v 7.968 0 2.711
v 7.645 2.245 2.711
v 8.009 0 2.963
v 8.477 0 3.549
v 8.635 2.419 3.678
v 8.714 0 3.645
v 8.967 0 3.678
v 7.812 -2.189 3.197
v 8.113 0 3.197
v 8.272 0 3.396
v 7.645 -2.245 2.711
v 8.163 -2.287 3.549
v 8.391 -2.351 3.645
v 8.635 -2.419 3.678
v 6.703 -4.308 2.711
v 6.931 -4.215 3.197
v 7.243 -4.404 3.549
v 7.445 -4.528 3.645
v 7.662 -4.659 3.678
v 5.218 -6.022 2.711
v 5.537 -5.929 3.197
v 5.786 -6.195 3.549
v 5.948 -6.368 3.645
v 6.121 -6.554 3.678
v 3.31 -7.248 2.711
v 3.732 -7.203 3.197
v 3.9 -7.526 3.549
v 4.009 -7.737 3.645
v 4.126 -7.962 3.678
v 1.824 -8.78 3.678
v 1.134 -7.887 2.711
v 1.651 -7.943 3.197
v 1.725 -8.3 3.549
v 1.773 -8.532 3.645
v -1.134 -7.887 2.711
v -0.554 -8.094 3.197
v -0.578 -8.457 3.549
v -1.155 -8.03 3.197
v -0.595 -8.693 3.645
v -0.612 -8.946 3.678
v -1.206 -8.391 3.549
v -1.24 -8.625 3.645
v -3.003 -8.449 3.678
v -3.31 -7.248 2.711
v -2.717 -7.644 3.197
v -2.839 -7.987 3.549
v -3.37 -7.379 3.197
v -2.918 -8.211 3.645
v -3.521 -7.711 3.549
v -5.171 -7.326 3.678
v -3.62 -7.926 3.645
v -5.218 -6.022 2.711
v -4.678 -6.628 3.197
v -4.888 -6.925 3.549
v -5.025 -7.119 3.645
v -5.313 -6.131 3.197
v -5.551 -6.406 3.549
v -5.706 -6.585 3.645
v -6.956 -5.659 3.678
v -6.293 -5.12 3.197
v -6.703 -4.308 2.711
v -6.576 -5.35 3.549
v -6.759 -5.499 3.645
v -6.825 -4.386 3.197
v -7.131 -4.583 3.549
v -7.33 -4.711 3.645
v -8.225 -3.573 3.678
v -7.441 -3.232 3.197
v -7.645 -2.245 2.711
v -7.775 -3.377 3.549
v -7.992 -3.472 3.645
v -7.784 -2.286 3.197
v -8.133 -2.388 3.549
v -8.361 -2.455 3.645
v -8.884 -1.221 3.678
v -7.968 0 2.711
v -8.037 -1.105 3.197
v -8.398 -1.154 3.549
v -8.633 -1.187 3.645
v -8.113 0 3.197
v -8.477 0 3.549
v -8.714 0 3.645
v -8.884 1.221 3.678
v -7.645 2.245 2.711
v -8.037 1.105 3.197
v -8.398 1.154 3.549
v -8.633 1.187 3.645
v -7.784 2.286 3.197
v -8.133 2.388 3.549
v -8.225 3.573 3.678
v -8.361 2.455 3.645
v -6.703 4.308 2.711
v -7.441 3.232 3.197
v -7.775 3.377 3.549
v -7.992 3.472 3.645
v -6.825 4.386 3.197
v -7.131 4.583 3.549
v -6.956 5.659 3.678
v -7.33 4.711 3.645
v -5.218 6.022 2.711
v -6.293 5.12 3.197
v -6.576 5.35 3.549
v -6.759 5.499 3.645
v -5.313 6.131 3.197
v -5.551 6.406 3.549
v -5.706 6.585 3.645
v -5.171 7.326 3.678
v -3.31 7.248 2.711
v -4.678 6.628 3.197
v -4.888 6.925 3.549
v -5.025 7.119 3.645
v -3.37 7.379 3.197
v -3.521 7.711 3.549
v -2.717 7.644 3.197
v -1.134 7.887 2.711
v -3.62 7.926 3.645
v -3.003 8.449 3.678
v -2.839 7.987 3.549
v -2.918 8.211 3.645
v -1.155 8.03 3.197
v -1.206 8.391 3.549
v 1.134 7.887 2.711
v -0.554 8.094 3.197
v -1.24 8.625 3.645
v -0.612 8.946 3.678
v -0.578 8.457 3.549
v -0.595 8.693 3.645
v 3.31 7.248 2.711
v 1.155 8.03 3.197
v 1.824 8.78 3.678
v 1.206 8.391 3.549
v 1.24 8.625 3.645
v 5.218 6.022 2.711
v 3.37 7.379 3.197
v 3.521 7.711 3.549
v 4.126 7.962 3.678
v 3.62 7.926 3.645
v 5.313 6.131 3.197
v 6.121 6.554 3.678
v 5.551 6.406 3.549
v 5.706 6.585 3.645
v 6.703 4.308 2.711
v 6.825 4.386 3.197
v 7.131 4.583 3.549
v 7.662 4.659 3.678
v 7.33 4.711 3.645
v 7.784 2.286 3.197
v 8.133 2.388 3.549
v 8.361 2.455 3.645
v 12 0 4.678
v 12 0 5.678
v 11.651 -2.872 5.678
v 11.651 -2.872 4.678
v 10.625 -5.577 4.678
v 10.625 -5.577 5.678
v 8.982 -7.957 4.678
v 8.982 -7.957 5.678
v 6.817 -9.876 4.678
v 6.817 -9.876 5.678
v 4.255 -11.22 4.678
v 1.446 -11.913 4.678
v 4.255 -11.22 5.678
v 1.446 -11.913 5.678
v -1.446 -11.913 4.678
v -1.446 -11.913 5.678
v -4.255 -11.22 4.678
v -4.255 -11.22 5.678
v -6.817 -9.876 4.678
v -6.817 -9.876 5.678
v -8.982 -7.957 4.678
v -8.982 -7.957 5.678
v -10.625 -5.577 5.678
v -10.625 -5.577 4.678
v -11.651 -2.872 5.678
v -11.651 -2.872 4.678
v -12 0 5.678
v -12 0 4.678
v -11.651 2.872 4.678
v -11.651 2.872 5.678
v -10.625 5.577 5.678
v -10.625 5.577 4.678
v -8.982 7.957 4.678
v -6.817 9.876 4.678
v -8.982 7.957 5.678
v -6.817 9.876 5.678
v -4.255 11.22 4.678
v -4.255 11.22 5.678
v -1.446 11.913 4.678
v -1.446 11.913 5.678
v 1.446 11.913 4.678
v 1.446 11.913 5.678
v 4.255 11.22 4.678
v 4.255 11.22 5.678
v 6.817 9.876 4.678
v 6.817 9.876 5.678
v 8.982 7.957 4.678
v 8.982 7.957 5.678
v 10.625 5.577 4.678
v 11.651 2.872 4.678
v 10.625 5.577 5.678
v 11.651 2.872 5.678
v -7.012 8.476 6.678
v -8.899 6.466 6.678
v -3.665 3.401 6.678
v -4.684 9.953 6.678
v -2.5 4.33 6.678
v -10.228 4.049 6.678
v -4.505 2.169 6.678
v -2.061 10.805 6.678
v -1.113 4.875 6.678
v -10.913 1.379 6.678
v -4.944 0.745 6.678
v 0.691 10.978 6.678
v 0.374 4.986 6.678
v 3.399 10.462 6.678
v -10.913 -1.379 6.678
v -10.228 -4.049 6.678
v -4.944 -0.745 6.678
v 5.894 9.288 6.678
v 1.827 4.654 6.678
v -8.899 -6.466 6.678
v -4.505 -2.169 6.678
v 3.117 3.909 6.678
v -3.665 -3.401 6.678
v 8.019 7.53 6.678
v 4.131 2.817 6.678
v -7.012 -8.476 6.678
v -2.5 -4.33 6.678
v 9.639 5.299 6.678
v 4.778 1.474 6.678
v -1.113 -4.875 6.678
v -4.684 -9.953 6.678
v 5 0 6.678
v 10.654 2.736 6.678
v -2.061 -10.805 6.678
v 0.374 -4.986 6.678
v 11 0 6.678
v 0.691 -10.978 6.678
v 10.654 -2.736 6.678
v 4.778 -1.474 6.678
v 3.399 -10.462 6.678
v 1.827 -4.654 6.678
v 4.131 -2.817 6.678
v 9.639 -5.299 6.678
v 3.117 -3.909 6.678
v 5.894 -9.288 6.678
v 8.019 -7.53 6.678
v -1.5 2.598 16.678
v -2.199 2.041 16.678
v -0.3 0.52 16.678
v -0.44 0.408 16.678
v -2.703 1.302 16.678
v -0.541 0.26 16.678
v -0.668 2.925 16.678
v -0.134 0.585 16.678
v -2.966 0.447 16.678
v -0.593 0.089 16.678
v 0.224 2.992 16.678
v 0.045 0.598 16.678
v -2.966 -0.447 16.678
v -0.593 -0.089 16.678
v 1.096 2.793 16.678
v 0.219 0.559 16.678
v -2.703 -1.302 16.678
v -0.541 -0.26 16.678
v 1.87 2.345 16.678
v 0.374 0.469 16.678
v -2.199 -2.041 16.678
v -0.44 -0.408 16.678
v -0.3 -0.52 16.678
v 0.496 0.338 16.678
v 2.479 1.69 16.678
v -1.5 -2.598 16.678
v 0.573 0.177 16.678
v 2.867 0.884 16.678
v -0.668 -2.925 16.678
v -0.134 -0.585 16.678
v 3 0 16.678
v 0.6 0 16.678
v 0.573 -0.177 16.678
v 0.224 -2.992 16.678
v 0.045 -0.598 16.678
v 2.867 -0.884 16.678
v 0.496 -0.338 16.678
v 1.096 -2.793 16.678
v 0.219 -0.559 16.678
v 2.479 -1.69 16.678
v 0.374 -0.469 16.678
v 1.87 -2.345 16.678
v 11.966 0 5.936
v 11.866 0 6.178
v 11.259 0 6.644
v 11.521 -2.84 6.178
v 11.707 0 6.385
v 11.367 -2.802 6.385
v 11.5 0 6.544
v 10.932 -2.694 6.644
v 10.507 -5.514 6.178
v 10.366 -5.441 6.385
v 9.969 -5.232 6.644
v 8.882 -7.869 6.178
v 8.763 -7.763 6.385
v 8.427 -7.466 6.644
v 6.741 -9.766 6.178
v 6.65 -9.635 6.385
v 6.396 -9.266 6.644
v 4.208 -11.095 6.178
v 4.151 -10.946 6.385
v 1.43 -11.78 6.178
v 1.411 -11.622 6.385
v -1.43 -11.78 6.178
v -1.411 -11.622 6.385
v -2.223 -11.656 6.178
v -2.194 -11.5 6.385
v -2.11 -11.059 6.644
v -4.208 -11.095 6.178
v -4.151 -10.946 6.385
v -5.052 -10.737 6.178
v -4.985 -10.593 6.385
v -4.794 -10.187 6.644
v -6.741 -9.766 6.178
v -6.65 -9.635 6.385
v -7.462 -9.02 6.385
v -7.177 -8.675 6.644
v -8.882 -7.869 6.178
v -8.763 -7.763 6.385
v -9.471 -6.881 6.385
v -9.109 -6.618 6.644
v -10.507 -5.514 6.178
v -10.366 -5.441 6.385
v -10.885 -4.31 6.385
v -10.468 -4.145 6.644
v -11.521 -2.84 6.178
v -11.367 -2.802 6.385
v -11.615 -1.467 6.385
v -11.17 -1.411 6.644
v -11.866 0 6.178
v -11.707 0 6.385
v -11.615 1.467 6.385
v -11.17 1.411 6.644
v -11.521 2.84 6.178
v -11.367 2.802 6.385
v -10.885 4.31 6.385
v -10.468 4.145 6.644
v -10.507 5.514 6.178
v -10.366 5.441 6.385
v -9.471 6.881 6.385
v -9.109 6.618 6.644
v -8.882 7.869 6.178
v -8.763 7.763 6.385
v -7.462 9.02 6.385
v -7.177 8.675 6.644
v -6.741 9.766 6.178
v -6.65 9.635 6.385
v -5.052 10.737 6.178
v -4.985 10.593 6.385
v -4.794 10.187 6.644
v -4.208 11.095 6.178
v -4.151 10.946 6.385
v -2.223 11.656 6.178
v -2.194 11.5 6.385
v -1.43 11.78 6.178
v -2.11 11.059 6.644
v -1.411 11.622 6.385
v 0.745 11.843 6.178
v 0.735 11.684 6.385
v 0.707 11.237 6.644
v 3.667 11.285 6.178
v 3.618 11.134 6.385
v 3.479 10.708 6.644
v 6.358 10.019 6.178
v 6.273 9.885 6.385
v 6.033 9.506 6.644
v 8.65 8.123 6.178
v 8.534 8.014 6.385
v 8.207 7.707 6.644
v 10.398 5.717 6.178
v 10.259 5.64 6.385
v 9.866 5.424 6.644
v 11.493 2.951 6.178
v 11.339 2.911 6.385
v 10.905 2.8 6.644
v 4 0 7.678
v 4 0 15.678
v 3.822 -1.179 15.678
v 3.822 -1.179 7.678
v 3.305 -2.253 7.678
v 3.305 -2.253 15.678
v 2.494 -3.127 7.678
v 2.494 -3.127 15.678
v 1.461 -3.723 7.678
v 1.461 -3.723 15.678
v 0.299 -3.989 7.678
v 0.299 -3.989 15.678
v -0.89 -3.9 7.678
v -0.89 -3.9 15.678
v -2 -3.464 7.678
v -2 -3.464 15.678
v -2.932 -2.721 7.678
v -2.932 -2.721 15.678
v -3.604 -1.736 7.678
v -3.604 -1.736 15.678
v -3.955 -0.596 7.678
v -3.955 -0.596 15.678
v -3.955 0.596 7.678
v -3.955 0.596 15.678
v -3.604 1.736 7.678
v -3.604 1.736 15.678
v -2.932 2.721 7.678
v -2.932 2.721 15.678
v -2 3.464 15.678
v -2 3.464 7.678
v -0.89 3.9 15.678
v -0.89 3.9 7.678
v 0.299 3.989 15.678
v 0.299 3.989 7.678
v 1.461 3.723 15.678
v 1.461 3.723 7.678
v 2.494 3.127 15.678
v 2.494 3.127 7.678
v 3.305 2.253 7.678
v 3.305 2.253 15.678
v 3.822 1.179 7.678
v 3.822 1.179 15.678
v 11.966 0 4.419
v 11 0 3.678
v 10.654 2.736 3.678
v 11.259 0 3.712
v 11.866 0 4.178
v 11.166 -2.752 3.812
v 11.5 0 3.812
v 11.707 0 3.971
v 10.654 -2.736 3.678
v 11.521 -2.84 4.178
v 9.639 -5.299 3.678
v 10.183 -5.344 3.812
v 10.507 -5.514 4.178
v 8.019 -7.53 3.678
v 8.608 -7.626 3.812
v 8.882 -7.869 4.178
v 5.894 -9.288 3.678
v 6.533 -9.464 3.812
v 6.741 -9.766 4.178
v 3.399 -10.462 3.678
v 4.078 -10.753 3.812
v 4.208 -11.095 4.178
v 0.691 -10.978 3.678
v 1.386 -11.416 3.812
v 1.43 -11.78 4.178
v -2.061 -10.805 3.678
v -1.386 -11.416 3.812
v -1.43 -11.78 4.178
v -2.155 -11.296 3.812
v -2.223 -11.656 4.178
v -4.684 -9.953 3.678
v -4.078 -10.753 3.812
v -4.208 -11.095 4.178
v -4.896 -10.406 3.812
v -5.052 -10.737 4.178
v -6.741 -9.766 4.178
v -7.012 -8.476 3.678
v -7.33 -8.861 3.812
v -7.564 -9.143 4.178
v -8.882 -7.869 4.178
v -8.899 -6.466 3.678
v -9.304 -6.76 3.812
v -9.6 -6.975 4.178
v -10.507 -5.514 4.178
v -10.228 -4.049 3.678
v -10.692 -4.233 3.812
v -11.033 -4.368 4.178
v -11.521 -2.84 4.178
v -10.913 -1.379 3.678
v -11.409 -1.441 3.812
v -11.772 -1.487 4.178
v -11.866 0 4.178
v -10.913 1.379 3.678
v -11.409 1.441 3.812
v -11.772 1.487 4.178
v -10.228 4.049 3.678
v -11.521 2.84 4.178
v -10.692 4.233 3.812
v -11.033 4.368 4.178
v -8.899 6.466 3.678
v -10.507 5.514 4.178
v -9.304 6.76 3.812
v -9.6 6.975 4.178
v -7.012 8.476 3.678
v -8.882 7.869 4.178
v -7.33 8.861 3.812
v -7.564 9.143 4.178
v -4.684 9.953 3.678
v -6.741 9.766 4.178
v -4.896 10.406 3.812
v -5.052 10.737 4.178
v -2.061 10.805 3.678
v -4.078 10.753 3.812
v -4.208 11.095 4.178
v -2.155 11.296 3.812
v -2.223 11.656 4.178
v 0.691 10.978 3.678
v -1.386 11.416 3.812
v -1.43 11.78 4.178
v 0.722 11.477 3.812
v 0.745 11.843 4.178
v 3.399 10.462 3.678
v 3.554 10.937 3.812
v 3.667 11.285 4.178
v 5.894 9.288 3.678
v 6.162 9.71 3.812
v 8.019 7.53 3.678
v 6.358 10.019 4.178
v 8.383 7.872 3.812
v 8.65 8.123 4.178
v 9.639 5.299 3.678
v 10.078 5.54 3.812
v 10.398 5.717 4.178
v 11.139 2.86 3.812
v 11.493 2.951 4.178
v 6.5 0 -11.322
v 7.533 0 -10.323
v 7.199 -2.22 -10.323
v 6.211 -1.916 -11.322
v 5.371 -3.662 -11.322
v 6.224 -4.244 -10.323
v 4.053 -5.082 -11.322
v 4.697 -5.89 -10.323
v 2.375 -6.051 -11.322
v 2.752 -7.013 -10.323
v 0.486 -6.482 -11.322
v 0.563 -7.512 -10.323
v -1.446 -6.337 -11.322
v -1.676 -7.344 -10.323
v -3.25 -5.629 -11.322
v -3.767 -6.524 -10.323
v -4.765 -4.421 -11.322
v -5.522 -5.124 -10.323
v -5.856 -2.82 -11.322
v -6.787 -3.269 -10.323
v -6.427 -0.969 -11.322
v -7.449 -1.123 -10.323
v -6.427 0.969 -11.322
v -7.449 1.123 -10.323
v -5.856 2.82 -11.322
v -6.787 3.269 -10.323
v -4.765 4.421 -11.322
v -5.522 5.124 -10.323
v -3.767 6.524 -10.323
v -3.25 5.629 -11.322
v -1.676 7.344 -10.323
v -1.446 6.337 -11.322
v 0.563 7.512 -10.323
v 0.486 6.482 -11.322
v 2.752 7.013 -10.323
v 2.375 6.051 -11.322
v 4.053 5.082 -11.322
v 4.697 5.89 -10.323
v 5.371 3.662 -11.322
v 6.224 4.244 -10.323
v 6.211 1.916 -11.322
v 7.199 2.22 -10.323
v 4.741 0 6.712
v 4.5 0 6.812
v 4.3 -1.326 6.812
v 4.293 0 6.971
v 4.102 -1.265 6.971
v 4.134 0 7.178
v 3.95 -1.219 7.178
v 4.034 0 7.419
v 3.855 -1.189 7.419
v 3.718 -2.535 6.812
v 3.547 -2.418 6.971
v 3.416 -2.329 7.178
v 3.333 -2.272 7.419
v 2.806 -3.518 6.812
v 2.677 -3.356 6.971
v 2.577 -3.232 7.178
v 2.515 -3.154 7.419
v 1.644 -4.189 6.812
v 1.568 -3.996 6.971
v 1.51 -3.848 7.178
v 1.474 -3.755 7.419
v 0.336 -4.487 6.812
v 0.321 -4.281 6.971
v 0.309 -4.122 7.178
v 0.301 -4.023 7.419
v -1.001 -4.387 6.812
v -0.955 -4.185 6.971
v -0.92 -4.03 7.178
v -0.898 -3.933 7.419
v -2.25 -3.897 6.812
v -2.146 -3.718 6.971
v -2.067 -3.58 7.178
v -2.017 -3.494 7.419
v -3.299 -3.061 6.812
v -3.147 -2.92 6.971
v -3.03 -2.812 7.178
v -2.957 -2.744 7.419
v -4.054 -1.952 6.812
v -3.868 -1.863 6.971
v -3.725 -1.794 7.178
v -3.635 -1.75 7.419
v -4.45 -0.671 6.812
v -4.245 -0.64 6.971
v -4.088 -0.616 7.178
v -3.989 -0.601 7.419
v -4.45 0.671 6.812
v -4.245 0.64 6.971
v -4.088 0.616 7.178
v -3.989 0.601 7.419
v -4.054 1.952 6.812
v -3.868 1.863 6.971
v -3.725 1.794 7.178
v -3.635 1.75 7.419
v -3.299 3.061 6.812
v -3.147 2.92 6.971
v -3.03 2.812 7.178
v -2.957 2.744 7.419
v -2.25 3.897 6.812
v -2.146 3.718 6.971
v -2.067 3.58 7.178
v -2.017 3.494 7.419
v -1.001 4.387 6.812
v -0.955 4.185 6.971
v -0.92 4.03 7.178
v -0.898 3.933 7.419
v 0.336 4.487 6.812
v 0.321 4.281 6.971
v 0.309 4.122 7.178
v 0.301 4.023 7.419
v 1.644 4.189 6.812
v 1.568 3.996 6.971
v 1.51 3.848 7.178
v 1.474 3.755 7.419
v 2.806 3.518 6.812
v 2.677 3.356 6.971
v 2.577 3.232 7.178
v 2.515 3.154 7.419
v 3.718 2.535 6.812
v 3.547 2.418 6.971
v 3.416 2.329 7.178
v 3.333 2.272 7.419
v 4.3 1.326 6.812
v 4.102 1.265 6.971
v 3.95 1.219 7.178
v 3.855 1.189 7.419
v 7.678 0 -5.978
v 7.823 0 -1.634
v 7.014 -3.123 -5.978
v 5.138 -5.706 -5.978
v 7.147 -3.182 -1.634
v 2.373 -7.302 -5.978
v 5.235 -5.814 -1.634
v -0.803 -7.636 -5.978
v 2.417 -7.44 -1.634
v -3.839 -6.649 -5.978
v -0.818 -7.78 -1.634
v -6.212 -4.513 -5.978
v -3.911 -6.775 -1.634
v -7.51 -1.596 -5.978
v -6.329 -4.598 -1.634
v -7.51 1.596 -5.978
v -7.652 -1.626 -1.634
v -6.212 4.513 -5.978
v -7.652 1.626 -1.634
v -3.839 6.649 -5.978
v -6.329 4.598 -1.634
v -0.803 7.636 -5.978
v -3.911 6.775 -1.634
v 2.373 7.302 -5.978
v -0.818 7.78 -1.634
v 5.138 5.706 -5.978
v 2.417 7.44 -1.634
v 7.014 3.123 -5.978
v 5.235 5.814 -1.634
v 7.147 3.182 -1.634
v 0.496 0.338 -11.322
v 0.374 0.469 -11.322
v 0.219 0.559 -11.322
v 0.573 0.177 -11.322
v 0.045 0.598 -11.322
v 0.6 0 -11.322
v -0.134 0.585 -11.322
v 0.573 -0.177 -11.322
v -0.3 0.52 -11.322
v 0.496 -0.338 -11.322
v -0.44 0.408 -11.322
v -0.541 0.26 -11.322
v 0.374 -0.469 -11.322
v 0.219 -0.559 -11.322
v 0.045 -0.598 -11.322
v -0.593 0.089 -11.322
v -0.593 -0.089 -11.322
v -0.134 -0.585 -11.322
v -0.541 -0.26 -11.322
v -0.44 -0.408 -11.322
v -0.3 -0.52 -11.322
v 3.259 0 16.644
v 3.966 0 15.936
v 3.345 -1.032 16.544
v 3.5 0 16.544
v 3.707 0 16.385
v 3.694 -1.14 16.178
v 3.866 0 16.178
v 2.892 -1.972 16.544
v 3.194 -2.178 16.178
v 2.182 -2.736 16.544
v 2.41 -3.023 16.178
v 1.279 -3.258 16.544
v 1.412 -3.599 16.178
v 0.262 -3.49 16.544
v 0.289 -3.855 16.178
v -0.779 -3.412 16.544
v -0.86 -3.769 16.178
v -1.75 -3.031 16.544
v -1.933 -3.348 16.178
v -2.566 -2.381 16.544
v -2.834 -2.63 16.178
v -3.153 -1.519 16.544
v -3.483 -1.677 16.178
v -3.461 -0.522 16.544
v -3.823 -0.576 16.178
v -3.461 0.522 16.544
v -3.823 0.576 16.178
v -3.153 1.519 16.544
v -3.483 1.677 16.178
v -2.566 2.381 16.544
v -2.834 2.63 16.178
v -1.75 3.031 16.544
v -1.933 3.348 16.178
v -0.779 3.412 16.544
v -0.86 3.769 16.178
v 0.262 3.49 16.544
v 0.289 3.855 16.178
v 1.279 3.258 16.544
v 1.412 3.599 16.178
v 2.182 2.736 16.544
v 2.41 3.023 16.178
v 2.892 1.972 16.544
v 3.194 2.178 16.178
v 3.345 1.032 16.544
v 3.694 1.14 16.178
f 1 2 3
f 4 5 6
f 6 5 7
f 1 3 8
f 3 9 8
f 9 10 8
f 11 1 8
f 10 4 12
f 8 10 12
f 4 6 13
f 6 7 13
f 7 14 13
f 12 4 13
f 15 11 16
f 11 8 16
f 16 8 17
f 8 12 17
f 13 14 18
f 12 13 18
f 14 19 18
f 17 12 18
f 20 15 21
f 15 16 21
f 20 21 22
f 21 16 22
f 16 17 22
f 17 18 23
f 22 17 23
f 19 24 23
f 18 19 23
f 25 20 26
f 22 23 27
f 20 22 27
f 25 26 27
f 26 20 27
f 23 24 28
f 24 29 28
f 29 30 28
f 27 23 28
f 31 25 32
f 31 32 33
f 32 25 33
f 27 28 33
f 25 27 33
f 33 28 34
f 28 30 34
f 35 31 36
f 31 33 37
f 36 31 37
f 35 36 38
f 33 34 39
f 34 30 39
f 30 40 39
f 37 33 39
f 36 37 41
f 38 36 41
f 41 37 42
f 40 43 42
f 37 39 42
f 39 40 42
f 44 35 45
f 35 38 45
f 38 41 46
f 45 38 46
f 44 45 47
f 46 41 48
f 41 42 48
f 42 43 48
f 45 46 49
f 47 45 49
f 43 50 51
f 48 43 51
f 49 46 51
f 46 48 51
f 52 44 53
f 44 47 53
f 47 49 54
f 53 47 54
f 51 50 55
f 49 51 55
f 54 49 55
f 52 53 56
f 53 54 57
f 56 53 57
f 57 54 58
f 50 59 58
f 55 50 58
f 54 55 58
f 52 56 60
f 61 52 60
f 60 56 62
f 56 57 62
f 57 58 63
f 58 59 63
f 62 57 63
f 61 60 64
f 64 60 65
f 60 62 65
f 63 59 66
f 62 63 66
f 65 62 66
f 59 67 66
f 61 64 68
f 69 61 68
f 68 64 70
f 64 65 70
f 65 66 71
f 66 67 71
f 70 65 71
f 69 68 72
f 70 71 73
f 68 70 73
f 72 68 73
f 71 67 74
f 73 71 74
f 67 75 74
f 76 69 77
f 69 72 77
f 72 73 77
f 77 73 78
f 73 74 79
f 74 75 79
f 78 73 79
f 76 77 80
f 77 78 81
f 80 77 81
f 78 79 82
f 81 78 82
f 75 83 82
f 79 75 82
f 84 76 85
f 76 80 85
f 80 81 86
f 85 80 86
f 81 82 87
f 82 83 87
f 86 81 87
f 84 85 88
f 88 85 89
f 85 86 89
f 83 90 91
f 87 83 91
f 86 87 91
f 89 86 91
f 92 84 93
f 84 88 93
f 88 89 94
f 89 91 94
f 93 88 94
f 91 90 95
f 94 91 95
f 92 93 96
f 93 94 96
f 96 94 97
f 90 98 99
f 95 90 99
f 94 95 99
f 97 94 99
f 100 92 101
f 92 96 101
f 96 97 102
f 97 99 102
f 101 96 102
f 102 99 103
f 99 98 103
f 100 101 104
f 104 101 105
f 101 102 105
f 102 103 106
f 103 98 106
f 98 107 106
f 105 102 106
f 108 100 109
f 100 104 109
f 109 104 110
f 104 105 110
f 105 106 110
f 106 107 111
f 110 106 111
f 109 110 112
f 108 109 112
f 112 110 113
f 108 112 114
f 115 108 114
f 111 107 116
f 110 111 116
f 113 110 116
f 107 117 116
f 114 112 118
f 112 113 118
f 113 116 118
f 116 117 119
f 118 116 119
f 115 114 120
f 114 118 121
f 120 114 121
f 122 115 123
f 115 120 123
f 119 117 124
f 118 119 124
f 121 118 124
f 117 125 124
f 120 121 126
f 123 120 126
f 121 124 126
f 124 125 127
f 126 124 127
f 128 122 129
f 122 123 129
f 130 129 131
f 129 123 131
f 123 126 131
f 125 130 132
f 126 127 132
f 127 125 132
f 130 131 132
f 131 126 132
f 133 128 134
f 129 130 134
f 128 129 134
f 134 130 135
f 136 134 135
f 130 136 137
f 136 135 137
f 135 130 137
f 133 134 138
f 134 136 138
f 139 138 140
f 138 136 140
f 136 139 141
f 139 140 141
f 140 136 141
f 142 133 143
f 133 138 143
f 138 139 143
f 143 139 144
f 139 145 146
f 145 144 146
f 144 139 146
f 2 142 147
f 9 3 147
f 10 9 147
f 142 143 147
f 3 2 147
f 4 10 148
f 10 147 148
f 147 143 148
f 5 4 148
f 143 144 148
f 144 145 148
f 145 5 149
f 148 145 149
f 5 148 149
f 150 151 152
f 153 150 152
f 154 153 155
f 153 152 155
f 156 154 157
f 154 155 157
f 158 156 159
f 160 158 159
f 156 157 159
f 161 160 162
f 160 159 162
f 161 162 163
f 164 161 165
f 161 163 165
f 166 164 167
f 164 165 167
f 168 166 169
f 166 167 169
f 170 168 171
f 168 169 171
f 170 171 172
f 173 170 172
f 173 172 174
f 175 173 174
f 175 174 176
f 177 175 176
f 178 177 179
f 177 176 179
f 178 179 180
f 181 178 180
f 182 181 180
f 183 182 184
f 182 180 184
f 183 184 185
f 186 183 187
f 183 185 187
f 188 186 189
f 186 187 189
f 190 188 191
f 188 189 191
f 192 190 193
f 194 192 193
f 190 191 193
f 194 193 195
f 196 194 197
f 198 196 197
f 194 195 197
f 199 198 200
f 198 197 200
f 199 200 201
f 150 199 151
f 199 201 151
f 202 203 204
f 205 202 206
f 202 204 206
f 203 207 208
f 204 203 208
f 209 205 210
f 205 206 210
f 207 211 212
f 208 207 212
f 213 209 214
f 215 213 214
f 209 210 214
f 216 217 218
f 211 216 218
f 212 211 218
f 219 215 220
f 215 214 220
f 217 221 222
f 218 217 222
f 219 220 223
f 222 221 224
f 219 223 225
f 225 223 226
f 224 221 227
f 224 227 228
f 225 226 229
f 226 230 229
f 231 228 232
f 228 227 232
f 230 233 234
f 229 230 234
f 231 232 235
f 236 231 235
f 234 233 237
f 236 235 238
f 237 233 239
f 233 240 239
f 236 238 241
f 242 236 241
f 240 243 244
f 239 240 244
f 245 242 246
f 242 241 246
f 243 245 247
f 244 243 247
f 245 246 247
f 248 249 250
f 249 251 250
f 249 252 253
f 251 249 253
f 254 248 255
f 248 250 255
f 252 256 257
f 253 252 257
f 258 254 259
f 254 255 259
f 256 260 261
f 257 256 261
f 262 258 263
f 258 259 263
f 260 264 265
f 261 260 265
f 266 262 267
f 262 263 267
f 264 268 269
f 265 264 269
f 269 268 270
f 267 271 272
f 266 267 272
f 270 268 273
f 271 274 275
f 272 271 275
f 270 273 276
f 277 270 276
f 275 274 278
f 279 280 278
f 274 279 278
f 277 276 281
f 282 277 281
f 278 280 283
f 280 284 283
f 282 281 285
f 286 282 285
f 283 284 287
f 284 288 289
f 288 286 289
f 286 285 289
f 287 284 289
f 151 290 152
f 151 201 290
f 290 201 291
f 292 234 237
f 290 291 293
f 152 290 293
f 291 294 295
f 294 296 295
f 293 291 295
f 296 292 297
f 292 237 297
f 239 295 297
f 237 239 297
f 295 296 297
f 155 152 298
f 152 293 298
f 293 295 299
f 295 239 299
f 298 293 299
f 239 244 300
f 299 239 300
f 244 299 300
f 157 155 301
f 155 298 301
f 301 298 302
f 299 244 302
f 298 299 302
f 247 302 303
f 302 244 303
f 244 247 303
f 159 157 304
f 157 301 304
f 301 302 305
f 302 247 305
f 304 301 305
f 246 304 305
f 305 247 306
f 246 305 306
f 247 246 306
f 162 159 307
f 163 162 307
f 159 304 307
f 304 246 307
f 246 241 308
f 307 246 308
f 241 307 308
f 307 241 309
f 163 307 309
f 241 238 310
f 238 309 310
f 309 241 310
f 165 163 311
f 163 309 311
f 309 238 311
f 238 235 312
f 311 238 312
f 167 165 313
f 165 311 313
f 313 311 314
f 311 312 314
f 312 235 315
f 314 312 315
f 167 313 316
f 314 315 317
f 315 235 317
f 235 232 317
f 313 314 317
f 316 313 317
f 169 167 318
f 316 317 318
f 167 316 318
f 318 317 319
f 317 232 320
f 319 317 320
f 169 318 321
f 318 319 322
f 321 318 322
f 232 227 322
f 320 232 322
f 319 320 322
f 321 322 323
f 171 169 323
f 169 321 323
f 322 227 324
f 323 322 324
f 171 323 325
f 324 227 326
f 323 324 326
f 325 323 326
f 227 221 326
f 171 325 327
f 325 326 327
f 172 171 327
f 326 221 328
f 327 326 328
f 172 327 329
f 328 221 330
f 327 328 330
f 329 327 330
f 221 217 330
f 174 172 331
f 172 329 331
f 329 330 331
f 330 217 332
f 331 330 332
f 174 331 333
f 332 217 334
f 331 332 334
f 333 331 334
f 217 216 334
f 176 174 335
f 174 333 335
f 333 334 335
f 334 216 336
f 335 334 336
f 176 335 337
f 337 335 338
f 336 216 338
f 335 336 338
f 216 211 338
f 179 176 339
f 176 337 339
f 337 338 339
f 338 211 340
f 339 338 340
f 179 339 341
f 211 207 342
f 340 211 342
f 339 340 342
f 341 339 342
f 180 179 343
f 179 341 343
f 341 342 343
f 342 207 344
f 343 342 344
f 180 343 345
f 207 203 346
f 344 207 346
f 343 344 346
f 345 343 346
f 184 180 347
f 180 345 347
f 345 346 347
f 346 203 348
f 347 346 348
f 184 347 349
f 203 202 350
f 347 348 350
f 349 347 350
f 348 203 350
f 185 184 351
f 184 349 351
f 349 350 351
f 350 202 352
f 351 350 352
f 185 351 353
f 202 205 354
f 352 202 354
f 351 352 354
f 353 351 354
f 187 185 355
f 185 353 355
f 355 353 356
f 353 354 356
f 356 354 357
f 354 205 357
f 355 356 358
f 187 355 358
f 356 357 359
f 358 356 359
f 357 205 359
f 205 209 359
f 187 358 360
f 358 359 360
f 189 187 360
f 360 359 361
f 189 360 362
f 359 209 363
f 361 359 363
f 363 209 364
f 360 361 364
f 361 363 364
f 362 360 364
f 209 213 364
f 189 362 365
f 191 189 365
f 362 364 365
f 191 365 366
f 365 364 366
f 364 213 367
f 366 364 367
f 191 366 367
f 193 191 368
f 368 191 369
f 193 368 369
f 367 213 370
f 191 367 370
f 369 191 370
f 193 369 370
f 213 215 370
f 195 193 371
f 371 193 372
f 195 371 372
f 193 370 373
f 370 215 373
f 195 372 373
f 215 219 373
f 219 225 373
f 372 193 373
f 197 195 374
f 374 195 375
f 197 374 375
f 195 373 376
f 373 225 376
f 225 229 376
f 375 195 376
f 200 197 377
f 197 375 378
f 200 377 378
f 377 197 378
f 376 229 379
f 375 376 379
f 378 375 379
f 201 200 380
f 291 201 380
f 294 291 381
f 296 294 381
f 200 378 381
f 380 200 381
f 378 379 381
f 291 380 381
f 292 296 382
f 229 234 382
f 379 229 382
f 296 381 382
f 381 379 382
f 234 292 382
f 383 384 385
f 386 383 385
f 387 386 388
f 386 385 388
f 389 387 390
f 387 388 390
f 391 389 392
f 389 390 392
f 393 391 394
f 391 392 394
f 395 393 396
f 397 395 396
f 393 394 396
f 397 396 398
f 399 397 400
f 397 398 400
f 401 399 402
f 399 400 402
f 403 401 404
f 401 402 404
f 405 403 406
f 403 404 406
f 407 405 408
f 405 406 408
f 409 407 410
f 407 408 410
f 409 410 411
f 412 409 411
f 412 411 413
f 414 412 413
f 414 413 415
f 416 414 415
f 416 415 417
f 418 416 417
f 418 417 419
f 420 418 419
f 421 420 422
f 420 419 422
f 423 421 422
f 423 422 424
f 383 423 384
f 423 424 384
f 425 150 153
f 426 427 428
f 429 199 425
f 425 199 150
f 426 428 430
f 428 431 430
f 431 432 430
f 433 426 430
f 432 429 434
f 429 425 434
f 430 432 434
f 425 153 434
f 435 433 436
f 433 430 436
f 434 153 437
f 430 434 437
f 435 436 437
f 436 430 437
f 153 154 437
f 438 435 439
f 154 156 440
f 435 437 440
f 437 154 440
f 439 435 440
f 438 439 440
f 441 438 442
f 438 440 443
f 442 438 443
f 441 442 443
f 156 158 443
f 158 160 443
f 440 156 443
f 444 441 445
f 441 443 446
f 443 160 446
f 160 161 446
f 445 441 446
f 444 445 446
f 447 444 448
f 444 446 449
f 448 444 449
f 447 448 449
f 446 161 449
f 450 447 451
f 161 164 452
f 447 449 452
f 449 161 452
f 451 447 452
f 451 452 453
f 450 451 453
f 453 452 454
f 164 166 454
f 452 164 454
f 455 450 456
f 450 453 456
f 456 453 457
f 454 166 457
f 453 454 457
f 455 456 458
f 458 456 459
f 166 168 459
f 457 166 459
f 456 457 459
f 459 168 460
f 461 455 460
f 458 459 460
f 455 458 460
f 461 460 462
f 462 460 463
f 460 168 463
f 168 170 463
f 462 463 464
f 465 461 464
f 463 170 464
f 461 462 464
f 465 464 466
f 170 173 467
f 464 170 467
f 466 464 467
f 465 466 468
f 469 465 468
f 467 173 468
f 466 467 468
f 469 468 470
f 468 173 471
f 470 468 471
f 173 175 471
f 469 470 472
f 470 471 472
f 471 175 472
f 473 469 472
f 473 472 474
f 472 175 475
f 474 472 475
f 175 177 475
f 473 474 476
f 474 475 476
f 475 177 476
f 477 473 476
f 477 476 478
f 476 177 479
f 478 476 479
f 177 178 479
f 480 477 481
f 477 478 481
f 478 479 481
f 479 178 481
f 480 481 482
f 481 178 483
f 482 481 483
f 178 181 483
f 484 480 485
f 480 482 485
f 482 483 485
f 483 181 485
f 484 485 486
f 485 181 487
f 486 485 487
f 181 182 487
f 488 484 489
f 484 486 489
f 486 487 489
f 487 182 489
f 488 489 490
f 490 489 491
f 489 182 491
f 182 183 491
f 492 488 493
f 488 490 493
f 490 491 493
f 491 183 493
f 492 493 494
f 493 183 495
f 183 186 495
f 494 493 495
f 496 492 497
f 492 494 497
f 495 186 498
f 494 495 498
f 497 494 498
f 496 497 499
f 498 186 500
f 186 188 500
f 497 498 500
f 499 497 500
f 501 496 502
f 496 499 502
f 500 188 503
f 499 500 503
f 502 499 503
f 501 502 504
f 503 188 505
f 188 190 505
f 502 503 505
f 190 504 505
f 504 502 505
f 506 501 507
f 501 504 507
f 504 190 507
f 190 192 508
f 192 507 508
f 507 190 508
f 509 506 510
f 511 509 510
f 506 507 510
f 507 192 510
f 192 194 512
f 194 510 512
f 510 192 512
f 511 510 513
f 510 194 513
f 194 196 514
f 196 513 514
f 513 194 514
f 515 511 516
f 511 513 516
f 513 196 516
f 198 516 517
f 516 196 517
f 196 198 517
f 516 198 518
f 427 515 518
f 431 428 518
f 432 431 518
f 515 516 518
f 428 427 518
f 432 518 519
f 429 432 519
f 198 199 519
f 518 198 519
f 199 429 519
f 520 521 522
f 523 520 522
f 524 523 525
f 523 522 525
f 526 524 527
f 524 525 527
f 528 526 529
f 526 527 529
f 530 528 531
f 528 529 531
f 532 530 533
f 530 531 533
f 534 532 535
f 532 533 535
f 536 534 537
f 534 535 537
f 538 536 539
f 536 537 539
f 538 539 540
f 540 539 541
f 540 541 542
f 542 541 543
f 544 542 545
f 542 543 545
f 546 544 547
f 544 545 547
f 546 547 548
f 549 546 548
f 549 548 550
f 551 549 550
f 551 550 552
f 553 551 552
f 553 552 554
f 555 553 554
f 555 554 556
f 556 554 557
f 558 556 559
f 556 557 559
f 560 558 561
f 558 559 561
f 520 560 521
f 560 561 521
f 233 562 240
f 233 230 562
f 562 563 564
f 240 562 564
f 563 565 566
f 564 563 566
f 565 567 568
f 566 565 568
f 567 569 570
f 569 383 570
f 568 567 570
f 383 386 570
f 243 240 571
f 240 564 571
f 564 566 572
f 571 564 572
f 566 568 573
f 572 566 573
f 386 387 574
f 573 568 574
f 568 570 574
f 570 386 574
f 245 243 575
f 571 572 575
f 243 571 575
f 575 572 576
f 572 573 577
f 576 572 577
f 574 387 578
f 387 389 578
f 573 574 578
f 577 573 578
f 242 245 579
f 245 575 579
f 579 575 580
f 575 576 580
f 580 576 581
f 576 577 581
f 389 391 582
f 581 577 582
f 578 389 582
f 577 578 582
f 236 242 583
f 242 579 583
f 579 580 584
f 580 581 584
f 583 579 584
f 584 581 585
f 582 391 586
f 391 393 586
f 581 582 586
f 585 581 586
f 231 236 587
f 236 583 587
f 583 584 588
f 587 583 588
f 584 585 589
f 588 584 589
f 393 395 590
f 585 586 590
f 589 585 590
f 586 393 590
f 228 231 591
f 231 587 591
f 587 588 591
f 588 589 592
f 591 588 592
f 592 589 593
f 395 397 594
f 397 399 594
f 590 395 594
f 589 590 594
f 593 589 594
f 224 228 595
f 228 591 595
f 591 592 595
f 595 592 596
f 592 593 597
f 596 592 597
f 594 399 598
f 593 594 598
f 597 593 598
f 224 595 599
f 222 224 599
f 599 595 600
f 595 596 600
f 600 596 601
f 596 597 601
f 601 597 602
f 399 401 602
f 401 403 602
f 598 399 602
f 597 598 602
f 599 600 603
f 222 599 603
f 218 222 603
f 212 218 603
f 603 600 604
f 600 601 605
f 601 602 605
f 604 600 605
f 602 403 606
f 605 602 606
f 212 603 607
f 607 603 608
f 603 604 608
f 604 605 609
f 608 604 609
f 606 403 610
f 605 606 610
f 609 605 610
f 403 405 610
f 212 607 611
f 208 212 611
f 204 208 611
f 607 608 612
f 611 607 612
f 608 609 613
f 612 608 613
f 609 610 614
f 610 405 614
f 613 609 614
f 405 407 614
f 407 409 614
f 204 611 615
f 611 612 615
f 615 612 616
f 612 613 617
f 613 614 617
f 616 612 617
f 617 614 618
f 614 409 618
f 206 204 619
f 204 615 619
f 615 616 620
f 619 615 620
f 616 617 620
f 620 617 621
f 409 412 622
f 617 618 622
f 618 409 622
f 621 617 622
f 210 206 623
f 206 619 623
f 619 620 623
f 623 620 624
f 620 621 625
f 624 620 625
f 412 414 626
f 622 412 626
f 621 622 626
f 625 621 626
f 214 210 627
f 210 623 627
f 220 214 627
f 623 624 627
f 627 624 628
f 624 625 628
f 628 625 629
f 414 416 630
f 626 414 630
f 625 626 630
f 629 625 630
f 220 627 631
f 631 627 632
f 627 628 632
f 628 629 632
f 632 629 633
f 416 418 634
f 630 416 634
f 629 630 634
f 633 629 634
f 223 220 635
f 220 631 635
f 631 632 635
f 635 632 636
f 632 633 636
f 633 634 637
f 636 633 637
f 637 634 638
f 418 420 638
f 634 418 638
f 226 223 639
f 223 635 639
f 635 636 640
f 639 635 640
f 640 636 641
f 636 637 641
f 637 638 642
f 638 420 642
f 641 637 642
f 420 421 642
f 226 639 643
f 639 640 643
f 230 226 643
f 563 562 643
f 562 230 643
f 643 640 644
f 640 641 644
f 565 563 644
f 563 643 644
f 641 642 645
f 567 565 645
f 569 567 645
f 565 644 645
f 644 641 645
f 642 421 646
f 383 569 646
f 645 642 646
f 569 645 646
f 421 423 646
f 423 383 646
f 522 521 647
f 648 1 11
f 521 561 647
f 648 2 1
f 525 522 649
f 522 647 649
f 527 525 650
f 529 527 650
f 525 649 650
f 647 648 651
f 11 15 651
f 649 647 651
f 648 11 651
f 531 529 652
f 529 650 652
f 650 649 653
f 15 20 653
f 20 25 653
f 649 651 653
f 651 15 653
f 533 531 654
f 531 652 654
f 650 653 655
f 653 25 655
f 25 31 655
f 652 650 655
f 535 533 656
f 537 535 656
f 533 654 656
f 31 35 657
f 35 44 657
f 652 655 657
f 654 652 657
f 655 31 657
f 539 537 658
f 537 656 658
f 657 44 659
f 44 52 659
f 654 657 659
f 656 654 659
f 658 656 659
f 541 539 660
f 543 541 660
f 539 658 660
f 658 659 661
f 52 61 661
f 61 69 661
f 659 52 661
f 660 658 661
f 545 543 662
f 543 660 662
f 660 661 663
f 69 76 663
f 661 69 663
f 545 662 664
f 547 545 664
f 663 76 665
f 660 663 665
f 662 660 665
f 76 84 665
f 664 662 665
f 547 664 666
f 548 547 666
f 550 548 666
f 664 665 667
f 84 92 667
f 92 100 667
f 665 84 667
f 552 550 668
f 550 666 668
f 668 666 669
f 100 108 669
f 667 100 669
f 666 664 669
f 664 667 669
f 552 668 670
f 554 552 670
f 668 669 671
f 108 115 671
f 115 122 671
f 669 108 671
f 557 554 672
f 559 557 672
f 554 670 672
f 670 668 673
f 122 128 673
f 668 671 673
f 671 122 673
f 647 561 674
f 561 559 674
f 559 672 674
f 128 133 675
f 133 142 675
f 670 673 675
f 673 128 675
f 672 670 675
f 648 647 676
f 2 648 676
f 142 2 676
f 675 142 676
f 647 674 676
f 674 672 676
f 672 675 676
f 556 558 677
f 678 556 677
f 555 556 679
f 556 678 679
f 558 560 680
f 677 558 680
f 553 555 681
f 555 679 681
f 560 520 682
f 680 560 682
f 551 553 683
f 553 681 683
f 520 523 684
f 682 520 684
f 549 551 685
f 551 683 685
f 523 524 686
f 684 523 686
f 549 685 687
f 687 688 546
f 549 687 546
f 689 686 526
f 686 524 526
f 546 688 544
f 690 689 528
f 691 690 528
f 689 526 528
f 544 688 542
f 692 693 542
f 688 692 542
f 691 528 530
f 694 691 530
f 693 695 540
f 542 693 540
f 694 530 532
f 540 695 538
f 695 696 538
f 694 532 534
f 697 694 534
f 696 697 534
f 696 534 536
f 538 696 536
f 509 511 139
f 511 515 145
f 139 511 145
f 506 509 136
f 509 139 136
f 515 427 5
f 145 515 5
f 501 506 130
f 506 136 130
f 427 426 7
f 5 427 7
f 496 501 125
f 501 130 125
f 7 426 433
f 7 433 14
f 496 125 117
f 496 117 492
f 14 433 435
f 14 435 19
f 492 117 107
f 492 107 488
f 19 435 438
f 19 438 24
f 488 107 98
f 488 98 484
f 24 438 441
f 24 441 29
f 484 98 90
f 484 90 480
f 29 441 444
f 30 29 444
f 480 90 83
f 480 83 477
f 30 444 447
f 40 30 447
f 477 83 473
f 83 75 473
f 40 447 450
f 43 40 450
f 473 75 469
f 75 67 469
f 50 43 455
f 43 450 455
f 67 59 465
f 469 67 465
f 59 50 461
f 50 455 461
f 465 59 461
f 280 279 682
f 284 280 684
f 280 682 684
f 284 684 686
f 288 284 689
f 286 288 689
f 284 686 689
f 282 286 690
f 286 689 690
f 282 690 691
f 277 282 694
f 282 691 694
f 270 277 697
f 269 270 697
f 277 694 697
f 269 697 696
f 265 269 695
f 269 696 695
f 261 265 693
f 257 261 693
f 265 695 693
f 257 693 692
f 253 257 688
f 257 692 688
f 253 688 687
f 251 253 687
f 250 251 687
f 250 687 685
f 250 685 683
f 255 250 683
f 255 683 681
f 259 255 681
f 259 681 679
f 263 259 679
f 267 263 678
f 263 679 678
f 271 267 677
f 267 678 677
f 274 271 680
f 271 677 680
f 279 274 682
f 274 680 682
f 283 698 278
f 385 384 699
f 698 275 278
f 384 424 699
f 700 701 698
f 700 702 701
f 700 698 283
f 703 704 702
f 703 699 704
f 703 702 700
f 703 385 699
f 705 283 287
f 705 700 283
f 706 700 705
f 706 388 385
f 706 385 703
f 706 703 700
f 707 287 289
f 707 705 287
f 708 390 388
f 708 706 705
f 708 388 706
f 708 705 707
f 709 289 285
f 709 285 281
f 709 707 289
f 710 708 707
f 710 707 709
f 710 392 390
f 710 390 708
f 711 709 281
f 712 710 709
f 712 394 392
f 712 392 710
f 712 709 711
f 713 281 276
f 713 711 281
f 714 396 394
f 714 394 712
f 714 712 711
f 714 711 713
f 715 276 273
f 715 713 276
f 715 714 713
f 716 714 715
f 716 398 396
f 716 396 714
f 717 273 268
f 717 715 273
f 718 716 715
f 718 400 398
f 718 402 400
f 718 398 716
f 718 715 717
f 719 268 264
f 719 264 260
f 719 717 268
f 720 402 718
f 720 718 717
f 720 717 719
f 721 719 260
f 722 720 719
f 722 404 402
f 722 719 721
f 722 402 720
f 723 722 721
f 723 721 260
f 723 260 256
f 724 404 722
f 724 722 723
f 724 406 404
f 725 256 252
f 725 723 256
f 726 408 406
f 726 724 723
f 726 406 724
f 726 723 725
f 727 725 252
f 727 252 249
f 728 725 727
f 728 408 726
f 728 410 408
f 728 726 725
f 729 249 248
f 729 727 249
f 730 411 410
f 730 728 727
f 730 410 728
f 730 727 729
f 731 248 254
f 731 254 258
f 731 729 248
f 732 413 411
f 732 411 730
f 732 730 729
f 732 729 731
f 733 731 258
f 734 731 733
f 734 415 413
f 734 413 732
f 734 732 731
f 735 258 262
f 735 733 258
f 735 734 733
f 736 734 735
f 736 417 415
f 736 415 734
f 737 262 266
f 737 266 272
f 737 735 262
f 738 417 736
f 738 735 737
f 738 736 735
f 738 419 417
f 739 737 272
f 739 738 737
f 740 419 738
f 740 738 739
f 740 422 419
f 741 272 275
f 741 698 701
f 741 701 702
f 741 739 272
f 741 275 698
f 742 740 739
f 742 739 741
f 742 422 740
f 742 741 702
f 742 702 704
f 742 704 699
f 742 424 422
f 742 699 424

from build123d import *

# Parameters (mm, degrees)
F2_R    = 1
F3_SIZE = 1


with BuildPart() as f1:
    # F0 (on Front) → F1 (revolve)
    with BuildSketch(Plane.XZ):
        Polygon((4, 16.67762), (0.6, 16.67762), (0.6, -11.32238), (7.5, -11.32238), (8, 3.67762), (12, 3.67762), (12, 6.67762), (4, 6.67762), align=None)
    revolve(axis=Axis((0, 0, 0.295774), (0, 0, -1)))

    # F2
    f2_edges = [f1.edges().sort_by_distance(p)[0] for p in [
        (-8, 0, 3.67762),
        (-12, 0, 3.67762),
        (-12, 0, 6.67762),
        (-4, 0, 16.67762),
        (-4, 0, 6.67762),
    ]]
    fillet(f2_edges, radius=F2_R)

    # F3
    f3_edges = [f1.edges().sort_by_distance(p)[0] for p in [
        (-7.5, 0, -11.32238),
    ]]
    chamfer(f3_edges, length=F3_SIZE)


solid = f1.part
